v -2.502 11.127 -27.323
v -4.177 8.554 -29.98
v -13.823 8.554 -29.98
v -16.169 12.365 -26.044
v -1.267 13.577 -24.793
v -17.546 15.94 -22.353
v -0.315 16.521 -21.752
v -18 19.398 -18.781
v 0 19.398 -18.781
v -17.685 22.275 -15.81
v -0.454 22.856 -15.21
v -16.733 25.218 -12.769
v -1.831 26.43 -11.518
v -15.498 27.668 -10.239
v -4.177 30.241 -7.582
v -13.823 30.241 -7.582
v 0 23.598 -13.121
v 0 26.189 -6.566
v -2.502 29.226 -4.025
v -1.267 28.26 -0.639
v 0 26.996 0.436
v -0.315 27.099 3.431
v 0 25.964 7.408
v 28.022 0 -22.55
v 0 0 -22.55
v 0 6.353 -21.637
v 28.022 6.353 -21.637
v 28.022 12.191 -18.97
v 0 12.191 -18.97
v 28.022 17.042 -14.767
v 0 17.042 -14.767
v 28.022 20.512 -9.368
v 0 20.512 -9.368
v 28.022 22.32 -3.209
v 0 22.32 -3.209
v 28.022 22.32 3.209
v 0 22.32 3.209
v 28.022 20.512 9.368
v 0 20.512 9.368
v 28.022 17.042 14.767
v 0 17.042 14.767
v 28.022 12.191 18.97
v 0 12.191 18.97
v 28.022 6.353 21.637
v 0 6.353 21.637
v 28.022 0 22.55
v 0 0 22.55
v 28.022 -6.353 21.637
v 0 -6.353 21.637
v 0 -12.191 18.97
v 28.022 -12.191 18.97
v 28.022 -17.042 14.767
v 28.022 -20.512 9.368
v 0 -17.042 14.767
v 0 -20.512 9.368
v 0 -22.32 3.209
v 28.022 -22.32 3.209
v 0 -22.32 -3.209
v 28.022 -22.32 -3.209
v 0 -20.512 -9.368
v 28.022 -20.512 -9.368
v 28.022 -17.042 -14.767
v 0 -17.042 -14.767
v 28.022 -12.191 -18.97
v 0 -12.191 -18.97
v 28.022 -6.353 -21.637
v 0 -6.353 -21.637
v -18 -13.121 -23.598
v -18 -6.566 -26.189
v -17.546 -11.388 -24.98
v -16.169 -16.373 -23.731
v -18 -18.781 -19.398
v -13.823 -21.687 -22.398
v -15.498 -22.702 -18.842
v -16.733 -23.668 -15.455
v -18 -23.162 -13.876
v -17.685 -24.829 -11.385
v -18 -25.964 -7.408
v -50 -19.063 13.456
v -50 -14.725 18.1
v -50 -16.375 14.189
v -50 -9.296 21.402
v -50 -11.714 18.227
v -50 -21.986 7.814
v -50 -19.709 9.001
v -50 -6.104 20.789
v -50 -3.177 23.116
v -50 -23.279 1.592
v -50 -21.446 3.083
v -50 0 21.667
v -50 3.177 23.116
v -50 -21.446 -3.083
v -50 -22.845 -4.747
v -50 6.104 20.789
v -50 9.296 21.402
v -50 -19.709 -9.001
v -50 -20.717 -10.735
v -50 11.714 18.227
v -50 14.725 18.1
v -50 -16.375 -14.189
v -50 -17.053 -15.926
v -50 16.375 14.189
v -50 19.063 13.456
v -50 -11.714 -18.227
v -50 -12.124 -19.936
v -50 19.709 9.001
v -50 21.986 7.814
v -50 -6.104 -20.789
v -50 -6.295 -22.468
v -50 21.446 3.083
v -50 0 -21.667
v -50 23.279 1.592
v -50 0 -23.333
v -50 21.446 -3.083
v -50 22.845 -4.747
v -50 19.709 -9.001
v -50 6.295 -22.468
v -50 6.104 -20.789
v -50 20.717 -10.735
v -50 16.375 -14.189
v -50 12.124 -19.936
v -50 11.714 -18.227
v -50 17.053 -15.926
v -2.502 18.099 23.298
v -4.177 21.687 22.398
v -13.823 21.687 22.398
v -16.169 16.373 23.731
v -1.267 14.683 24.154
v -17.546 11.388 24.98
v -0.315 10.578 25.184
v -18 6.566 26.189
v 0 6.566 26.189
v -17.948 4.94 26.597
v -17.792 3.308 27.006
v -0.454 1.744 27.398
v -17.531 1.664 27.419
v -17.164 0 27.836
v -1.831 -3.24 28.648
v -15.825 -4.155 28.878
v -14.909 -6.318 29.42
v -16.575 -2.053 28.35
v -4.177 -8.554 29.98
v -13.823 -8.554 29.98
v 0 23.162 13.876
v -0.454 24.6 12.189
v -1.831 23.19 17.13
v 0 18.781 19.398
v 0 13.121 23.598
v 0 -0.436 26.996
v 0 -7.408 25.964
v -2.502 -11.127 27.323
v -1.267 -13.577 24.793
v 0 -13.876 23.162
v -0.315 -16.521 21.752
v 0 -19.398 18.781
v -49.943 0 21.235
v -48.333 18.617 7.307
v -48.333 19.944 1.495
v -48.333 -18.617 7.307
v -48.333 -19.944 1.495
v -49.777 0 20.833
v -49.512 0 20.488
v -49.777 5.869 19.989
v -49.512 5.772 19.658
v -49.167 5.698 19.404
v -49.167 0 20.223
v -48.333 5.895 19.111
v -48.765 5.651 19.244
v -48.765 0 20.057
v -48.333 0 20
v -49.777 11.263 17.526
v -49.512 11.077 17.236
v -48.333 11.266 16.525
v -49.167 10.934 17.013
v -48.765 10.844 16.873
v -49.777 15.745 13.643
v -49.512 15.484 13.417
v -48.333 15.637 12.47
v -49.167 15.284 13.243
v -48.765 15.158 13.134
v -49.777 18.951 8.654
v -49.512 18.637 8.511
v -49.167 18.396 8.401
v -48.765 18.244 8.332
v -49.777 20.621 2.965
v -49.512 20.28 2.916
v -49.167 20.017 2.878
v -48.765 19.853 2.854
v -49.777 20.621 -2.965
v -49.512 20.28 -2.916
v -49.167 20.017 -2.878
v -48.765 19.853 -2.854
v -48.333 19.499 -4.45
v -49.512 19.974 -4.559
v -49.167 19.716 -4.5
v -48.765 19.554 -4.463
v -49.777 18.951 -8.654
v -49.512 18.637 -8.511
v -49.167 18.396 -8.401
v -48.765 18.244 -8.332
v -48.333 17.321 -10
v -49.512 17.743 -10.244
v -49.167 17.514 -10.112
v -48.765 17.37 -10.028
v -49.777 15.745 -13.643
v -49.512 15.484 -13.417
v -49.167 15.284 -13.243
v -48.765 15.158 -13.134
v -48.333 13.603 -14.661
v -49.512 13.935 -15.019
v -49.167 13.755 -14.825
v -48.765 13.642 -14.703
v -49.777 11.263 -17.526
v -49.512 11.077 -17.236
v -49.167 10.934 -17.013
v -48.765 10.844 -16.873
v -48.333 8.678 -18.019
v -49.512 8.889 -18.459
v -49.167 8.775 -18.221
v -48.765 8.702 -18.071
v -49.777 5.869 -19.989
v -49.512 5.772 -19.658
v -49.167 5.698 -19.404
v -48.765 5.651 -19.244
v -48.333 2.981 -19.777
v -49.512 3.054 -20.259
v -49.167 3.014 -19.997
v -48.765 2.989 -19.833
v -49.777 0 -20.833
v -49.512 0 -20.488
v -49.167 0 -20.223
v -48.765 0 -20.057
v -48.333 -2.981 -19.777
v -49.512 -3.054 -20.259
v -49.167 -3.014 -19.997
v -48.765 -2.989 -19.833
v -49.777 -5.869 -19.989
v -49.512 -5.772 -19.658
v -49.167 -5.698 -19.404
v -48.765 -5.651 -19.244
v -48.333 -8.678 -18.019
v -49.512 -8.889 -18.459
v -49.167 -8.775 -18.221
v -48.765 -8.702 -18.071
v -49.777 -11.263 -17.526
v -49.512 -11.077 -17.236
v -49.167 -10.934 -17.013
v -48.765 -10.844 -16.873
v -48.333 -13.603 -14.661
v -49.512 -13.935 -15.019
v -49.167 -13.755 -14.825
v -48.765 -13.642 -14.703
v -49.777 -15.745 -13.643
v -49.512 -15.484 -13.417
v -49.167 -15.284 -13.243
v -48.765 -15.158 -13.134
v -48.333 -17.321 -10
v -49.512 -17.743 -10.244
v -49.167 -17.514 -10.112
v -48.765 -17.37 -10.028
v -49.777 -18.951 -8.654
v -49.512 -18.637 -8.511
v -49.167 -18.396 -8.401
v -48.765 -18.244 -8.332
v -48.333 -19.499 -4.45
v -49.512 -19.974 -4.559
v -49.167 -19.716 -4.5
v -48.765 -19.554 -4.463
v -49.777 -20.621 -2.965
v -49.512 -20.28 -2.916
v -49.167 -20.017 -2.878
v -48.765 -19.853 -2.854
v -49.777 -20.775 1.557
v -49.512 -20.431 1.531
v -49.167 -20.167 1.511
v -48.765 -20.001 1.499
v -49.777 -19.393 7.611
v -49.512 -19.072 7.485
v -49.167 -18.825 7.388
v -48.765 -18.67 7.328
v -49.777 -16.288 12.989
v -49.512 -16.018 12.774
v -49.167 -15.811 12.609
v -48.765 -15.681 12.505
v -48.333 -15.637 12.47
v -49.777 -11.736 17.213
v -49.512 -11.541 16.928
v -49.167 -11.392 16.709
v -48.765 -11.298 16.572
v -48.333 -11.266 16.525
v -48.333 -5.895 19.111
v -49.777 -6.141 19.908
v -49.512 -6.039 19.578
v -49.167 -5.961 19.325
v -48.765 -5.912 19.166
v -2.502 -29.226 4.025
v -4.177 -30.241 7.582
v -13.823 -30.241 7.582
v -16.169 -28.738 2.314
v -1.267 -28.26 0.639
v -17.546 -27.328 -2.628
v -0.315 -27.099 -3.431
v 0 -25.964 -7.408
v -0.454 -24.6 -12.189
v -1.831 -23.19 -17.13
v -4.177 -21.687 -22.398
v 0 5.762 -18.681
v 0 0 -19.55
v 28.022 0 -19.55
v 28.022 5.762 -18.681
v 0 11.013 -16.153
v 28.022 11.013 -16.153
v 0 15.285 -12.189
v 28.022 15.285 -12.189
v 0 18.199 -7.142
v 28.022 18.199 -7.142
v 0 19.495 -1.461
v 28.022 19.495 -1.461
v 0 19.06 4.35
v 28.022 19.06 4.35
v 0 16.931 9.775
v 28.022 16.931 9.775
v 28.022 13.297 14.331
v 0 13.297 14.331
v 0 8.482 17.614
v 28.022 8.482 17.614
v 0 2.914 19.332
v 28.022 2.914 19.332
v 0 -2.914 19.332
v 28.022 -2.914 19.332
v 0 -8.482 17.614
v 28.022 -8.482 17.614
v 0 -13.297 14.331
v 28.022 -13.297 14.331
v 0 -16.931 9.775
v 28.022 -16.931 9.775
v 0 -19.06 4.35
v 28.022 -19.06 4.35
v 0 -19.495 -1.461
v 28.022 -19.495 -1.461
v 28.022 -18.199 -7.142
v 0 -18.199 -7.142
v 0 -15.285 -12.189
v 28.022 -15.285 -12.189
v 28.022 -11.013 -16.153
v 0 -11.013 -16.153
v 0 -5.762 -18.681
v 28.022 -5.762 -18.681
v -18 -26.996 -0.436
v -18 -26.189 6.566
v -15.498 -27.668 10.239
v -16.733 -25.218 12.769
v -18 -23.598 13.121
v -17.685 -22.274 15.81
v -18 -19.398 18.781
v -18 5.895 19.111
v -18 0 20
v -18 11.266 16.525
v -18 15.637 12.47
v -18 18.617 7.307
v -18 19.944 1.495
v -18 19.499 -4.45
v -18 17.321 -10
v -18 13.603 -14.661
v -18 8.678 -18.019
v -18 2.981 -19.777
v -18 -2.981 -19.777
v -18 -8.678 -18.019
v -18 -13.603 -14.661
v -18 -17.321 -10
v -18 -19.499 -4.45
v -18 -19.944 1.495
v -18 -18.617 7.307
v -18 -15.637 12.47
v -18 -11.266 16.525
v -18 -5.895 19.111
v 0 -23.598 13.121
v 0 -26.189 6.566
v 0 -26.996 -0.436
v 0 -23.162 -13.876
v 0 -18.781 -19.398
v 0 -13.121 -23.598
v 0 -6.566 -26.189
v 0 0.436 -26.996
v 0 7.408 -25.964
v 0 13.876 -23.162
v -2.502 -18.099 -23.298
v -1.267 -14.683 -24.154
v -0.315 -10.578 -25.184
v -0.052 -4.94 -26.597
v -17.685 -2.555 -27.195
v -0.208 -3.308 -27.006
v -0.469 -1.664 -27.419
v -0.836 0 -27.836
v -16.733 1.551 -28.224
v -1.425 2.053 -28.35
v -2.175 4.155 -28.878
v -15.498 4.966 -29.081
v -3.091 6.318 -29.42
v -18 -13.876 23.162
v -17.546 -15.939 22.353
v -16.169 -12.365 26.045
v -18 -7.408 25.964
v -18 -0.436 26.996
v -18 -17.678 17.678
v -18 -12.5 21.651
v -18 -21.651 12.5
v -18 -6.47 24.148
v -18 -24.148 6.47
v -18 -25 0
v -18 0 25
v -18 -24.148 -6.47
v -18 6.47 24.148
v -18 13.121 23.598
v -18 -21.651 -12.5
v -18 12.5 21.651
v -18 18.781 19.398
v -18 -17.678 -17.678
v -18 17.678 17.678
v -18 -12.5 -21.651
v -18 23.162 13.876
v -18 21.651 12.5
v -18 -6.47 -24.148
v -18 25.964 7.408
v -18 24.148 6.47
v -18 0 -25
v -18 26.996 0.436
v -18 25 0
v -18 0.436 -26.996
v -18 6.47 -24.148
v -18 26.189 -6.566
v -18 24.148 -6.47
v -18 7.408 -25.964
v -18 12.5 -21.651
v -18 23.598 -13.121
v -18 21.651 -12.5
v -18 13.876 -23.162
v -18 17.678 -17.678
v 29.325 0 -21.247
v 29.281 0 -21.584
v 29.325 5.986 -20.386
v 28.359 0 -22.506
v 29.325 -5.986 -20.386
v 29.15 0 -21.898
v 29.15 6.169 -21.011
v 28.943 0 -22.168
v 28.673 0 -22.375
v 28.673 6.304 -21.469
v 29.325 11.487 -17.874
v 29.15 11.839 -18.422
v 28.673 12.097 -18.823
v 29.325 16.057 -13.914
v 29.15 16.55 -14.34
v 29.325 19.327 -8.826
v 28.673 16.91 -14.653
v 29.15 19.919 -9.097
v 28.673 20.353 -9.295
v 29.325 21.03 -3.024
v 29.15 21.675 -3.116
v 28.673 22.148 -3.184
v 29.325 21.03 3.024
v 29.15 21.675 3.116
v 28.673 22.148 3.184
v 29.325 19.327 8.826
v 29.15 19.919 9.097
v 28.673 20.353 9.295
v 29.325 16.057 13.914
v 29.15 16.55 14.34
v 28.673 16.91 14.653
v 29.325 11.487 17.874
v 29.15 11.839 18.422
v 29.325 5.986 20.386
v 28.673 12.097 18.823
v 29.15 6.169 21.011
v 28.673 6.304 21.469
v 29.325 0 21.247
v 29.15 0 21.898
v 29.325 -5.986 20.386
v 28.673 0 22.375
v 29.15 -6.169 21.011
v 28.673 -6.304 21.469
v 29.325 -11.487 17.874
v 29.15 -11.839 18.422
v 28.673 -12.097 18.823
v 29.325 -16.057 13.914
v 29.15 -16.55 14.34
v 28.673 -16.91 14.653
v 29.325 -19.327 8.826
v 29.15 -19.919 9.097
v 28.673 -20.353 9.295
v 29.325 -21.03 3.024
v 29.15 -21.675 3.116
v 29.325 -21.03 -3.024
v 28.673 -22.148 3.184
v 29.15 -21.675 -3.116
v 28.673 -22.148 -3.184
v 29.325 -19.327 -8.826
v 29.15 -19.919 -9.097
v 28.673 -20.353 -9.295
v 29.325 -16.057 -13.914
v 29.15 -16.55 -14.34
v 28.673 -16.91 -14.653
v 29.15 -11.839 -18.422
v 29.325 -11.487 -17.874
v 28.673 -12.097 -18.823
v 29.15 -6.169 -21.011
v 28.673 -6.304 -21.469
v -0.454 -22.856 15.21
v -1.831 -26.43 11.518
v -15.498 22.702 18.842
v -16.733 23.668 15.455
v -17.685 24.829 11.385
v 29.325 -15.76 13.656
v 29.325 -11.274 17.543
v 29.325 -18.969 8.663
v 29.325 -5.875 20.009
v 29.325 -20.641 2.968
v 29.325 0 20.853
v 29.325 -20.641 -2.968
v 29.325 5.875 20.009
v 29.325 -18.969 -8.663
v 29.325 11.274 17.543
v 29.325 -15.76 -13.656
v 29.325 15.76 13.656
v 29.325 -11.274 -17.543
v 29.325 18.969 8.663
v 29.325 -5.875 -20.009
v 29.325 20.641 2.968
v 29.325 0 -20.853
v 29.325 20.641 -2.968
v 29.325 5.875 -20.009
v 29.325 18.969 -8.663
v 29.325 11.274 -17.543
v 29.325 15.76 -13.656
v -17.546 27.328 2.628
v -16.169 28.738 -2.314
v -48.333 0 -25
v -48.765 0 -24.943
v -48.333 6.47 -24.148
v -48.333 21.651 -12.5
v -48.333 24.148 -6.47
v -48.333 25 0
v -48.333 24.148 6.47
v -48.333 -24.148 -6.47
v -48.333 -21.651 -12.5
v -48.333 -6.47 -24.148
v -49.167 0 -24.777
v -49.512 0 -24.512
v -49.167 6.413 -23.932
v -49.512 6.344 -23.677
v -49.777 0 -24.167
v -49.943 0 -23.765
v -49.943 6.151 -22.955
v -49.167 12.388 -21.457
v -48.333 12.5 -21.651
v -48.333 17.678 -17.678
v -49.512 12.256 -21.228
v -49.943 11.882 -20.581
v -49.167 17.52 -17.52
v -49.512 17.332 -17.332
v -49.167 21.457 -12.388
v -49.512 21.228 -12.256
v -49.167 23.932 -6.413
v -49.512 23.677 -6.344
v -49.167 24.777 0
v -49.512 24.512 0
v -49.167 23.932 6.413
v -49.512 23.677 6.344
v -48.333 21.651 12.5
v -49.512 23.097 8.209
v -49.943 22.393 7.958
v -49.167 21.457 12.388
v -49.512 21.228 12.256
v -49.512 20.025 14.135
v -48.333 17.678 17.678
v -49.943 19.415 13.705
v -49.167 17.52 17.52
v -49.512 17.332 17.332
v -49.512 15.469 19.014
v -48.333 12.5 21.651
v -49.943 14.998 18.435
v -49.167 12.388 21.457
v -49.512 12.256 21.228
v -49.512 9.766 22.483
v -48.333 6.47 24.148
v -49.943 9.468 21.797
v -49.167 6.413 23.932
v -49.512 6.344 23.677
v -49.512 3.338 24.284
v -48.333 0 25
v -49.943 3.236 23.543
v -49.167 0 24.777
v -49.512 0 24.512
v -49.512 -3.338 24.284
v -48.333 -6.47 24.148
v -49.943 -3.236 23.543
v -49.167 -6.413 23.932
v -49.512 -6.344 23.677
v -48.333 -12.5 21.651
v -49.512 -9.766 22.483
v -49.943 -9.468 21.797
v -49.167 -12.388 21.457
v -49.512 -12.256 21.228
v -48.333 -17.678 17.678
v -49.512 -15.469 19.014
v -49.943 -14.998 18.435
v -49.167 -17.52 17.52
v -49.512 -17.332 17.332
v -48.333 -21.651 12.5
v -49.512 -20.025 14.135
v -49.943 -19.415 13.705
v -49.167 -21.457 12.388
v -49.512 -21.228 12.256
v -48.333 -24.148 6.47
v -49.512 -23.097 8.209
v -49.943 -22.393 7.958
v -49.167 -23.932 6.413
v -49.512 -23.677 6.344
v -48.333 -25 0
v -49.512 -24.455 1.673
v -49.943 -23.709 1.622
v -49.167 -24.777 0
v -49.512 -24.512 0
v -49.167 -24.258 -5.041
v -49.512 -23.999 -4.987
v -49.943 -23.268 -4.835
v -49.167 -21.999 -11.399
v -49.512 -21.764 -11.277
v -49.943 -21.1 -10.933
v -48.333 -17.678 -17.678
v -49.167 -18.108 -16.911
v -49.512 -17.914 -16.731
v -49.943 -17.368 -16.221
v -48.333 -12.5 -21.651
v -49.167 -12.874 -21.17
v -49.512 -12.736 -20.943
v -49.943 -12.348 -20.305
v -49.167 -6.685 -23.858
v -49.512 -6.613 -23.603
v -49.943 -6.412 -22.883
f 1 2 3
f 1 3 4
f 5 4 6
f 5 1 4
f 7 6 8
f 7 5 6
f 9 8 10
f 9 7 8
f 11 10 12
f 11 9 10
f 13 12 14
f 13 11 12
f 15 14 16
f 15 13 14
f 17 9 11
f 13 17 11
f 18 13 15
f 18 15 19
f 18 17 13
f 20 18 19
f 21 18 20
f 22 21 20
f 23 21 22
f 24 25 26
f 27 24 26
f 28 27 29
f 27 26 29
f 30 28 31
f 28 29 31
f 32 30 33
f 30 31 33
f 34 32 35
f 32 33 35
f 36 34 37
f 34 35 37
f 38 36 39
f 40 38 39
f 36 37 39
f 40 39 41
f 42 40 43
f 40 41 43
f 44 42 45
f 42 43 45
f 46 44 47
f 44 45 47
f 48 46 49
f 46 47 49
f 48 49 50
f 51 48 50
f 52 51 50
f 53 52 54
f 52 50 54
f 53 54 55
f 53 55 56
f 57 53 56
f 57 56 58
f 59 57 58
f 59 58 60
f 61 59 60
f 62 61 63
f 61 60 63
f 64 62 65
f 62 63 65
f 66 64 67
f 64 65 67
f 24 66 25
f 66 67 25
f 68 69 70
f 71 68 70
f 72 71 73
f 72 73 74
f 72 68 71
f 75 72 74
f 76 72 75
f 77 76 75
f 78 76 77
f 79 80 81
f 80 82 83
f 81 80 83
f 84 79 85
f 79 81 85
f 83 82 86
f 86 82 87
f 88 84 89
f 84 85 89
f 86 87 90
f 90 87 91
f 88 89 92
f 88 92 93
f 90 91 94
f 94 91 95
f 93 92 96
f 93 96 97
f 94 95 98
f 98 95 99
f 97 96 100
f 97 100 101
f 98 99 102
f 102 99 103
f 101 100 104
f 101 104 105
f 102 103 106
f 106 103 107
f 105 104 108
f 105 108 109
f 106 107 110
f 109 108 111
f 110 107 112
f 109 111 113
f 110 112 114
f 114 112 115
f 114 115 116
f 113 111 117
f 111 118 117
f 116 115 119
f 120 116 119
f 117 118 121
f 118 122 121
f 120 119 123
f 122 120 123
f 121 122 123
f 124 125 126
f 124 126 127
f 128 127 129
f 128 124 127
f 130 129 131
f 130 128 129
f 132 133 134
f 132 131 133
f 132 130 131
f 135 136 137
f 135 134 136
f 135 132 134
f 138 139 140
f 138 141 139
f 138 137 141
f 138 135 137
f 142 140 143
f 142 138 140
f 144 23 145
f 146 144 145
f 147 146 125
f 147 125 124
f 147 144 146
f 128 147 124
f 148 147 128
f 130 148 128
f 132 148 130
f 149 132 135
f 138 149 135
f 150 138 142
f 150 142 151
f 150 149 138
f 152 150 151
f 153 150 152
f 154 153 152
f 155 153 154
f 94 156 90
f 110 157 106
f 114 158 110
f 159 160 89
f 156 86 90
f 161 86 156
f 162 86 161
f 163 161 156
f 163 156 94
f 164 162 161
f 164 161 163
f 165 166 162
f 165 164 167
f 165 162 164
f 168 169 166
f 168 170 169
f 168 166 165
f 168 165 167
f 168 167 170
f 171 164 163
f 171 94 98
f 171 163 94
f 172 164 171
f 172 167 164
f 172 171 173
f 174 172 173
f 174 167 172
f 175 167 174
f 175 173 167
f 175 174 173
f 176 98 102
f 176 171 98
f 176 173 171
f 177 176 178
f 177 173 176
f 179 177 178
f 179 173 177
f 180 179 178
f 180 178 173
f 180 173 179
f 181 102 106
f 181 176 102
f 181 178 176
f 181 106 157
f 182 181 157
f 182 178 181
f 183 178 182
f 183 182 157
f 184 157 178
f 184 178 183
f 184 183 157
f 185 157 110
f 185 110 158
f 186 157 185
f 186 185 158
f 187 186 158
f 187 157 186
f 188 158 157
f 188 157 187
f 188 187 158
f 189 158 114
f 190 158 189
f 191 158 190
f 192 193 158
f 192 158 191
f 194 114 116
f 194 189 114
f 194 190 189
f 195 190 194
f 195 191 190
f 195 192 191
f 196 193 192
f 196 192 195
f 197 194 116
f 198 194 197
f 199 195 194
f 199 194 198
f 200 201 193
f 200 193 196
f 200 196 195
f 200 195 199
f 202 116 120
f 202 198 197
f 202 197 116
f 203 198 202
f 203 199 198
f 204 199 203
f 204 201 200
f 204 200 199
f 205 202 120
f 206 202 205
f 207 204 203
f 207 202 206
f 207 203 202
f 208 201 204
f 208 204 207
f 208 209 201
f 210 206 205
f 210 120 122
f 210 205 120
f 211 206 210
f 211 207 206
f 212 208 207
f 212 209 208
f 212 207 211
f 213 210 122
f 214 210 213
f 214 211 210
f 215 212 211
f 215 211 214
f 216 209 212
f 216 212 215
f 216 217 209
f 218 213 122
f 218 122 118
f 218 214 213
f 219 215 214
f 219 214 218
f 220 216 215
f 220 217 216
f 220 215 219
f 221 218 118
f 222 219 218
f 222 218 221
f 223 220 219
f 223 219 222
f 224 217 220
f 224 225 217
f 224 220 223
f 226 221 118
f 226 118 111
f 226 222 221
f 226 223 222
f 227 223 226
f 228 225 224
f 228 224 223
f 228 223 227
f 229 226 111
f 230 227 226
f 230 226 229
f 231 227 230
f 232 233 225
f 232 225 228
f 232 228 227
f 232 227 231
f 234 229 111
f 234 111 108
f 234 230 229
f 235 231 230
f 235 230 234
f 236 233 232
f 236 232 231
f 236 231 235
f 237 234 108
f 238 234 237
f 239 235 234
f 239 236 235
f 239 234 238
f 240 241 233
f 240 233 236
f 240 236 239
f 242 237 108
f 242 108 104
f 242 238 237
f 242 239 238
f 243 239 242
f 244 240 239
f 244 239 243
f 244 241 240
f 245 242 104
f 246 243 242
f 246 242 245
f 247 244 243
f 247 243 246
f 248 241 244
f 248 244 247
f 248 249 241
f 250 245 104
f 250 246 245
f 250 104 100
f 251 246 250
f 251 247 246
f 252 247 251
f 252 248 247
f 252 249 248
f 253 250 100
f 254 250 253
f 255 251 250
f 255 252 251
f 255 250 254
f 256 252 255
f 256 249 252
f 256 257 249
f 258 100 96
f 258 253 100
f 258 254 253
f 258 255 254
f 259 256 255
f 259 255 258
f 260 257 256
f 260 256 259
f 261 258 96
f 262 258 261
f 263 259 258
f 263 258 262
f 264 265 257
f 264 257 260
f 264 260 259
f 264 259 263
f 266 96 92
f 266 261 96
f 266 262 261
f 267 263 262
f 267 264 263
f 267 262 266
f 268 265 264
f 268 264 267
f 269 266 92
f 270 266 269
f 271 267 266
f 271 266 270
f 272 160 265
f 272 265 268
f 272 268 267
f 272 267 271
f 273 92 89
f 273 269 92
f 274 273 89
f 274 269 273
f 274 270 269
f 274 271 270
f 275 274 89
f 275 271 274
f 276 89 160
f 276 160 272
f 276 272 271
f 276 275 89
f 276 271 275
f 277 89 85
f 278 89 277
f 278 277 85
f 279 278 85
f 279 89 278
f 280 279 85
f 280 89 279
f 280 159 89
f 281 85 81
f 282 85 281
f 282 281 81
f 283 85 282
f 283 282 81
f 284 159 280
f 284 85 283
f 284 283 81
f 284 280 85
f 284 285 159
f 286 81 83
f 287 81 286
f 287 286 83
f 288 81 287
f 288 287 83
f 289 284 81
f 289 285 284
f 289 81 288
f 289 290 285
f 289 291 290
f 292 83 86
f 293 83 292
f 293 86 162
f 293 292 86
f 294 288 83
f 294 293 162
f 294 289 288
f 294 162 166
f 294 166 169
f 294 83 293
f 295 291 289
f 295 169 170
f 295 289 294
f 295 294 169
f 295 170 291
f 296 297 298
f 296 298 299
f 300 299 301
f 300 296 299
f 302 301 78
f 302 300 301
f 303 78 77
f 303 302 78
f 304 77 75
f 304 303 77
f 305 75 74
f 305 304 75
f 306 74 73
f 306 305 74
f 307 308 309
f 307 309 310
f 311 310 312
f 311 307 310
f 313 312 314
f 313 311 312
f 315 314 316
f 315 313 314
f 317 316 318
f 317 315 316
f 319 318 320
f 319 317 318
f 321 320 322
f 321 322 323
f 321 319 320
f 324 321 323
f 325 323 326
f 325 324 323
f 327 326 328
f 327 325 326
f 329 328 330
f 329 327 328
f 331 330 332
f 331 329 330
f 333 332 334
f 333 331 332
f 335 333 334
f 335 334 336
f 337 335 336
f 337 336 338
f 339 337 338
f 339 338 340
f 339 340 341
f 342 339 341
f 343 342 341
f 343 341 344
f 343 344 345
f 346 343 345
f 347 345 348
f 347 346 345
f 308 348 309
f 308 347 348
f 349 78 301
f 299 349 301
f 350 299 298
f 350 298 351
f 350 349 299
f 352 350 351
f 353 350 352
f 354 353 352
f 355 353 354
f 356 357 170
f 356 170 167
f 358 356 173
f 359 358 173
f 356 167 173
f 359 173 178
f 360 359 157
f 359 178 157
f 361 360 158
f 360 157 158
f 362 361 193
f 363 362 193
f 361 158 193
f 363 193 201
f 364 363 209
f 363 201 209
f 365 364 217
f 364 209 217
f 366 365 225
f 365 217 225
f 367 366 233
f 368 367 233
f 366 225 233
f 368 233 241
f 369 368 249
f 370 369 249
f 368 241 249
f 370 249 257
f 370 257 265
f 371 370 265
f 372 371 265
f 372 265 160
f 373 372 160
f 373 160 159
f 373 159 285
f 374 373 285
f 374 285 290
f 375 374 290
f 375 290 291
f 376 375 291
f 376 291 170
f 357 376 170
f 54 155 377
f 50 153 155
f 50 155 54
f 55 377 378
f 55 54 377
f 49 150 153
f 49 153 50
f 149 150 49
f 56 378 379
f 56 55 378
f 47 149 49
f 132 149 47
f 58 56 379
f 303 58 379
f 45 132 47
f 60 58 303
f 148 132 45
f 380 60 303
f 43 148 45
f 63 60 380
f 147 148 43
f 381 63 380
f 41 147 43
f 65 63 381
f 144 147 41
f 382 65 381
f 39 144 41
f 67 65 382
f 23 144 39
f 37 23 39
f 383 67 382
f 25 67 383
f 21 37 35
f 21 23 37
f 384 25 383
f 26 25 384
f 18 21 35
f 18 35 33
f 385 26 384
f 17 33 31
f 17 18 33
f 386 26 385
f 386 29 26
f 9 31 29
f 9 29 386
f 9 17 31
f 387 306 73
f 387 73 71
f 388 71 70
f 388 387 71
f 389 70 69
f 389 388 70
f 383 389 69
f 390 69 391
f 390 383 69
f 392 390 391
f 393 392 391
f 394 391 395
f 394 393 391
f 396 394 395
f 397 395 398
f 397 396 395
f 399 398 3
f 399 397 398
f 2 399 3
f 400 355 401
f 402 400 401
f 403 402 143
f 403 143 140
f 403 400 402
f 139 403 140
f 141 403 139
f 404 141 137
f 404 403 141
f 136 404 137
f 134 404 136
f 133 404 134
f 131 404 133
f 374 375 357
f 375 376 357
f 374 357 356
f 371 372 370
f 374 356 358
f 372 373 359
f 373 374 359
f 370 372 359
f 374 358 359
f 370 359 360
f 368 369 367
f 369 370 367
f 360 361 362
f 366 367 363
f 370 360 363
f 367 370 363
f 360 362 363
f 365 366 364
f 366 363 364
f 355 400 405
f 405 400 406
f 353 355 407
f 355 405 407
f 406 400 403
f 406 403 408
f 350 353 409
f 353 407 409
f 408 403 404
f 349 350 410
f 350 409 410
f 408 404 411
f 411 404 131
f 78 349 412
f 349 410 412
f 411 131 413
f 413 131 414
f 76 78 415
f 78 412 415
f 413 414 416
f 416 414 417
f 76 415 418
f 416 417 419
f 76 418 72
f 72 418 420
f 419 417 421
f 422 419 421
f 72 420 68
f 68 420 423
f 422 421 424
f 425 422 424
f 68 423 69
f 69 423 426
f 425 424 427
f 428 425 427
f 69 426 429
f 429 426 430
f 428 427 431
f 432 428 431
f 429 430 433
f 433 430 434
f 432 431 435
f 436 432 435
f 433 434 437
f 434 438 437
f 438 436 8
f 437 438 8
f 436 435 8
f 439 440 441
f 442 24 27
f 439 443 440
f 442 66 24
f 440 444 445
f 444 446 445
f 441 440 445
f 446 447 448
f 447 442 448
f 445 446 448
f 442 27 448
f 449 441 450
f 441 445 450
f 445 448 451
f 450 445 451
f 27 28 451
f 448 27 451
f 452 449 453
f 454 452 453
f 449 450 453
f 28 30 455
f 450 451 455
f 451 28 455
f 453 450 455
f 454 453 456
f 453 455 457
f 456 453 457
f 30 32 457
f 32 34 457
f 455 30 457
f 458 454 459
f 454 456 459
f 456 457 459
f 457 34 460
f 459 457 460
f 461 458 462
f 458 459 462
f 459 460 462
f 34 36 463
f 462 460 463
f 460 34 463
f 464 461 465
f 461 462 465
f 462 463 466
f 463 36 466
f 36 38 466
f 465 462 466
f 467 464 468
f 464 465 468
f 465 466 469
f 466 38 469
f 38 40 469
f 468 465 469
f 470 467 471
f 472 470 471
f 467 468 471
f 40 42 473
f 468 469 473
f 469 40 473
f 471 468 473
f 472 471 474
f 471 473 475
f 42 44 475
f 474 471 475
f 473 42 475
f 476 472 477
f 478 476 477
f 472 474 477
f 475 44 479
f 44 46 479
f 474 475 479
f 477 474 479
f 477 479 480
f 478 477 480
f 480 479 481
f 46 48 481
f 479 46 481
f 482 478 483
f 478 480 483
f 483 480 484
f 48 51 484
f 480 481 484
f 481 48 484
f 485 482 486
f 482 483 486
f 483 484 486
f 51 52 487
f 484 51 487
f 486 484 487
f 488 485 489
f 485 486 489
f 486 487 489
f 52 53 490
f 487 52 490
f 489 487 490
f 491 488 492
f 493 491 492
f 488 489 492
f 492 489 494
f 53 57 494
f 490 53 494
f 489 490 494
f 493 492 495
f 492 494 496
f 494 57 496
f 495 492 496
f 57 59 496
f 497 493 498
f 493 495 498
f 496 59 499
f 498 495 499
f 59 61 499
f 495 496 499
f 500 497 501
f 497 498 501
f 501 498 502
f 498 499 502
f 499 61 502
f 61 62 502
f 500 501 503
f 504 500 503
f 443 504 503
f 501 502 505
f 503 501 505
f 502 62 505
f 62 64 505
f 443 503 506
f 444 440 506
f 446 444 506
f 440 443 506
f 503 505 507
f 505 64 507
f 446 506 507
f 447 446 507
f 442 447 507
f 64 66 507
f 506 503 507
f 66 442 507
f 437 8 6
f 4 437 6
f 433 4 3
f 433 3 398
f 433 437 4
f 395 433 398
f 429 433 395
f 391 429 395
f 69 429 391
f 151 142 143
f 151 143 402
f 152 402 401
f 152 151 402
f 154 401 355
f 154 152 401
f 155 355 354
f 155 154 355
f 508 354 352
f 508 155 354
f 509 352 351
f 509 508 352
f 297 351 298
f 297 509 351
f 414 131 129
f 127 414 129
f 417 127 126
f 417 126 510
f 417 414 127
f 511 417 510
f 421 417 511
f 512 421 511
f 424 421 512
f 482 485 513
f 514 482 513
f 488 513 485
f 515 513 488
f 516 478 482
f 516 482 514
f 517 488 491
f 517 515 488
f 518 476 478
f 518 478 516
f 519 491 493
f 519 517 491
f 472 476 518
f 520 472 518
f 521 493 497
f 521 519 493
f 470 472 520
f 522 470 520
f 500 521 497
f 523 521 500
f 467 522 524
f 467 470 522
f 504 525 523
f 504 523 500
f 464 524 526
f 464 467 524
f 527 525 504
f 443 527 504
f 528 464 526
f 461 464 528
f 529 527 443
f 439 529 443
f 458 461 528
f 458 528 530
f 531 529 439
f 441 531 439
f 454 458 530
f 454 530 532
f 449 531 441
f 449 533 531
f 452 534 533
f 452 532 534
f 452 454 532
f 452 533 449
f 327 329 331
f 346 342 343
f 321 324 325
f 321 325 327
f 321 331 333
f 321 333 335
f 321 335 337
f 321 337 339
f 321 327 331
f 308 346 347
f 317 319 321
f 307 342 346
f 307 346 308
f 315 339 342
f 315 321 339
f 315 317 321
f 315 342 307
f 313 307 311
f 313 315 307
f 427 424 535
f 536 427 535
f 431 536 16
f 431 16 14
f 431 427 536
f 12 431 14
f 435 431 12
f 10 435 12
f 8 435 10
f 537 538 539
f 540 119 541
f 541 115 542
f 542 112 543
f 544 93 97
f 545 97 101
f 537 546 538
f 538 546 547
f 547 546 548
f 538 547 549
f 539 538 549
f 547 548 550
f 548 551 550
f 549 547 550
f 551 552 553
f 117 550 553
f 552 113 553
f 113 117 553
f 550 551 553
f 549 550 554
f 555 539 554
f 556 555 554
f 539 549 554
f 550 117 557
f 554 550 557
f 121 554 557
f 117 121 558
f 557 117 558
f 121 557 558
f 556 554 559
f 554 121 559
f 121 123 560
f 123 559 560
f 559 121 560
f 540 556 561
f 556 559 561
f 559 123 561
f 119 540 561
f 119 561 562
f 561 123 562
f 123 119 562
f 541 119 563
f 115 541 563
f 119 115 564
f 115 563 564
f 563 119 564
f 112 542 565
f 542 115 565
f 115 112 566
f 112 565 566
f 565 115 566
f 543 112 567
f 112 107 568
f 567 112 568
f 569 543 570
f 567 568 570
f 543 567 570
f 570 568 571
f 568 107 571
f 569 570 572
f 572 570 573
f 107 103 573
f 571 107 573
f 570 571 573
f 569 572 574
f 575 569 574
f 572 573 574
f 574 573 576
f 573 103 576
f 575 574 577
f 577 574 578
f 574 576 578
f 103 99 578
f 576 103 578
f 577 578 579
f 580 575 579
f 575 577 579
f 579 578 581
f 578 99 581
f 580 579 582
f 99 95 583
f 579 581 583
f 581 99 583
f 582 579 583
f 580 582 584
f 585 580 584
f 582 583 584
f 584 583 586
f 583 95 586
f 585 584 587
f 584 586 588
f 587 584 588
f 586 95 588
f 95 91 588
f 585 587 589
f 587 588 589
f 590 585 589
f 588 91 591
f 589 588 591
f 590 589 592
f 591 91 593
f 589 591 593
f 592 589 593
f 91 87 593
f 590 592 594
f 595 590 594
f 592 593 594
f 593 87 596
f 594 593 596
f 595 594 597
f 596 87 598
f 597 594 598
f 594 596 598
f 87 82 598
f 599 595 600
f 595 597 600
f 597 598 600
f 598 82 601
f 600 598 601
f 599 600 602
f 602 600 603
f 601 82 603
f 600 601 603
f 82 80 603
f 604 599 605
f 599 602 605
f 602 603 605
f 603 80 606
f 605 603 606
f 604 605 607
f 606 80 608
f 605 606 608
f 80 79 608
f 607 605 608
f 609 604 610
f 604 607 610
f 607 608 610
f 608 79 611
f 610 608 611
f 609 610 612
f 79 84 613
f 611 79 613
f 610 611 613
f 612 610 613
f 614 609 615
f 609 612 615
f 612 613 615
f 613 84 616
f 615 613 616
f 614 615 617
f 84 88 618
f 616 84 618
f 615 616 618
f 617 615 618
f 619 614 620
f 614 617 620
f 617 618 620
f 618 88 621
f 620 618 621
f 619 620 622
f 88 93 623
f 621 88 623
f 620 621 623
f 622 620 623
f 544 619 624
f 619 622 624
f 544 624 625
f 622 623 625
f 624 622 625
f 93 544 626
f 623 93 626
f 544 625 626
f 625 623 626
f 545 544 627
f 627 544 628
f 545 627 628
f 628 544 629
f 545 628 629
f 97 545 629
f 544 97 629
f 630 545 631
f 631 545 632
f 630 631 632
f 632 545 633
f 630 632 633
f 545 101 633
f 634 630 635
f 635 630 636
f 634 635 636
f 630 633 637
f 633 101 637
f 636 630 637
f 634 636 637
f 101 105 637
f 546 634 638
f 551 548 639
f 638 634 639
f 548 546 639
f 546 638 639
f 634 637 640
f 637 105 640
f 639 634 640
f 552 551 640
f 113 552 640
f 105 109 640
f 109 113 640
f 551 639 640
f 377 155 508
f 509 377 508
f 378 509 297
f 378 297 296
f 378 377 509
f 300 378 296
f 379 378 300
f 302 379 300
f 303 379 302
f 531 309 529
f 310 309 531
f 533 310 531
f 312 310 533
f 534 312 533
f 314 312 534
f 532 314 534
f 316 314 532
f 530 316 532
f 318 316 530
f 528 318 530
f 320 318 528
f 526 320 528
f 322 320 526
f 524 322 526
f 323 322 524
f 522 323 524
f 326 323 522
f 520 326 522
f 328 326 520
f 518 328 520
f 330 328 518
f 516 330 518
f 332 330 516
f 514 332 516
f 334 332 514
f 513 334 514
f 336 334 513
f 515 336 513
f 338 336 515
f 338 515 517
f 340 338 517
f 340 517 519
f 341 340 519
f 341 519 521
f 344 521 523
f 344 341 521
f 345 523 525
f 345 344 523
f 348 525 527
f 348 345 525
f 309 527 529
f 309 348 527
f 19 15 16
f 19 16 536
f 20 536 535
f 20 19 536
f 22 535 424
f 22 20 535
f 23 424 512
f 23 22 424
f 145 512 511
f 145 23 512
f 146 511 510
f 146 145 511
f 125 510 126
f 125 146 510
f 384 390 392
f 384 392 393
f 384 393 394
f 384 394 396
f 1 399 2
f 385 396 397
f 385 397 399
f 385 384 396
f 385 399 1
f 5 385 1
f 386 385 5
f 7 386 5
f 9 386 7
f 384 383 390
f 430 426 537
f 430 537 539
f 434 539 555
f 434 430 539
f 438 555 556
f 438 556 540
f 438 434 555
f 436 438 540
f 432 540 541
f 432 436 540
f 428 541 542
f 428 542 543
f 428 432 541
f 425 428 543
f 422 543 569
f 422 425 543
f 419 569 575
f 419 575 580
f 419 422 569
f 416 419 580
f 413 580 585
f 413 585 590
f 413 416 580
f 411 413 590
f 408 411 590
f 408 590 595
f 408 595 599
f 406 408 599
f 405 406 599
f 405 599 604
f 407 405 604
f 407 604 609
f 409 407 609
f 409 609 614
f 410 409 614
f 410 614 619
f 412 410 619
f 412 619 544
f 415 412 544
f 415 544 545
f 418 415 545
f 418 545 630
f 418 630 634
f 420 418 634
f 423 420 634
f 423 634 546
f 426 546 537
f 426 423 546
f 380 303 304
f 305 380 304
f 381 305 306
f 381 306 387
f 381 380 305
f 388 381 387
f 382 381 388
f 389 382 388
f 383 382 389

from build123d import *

# Parameters (mm, degrees)
SKETCH_1_R          = 25
EXTRUDE_1_DEPTH     = 50
SKETCH_2_R          = 20
CUT_EXTRUDE_1_DEPTH = 48
EXTRUDE_2_DEPTH     = 18
SKETCH_4_OUTSIDE_W  = 101.712
SKETCH_4_OUTSIDE_H  = 102.234
SKETCH_4_OUTSIDE_R  = 27
CUT_EXTRUDE_3_DEPTH = 10
CUT_EXTRUDE_3_DRAFT = -45
SKETCH_5_OUTSIDE_W  = 101.712
SKETCH_5_OUTSIDE_H  = 102.234
SKETCH_5_OUTSIDE_R  = 27
CUT_EXTRUDE_4_DEPTH = 10
CUT_EXTRUDE_4_DRAFT = -45
SKETCH_6_R          = 22.55
SKETCH_6_R_2        = 19.55
EXTRUDE_1_2_DEPTH   = 29.325
FILLET_1_R          = 1.666666667
CHAMFER_1_SIZE      = 1.303333333
FILLET_2_R          = 1.303333333


with BuildPart() as part:
    # Эскиз1 → Extrude 1 (new body)
    with BuildSketch(Plane(origin=(0, 0, 0), x_dir=(0, 0, -1), z_dir=(1, 0, 0))):
        Circle(SKETCH_1_R)
    extrude(amount=-EXTRUDE_1_DEPTH)

    # Эскиз2 → Вырез-Вытянуть1 (cut)
    with BuildSketch(Plane.ZY.offset(50)):
        Circle(SKETCH_2_R)
    extrude(amount=-CUT_EXTRUDE_1_DEPTH, mode=Mode.SUBTRACT)

    # Эскиз3 → Бобышка-Вытянуть2 (add)
    with BuildSketch(Plane(origin=(0, 0, 0), x_dir=(0, 0, -1), z_dir=(1, 0, 0))):
        Polygon((22.398442547, -21.686626558), (29.980390795, 8.554306971), (7.581948249, 30.24093353), (-22.398442547, 21.686626558), (-29.980390795, -8.554306971), (-7.581948249, -30.24093353), align=None)
    extrude(amount=-EXTRUDE_2_DEPTH)


with BuildPart() as cut_extrude_3_tool:
    # Эскиз4 outside → Вырез-Вытянуть3 (with draft: the straight prism first)
    with BuildSketch(Plane(origin=(0, 0, 0), x_dir=(0, 0, -1), z_dir=(1, 0, 0))):
        Rectangle(SKETCH_4_OUTSIDE_W, SKETCH_4_OUTSIDE_H)
        Circle(SKETCH_4_OUTSIDE_R, mode=Mode.SUBTRACT)
    extrude(amount=-CUT_EXTRUDE_3_DEPTH)
    # Вырез-Вытянуть3: the draft: its side faces are tilted about the plane it starts from
    cut_extrude_3_sides = [cut_extrude_3_tool.faces().sort_by_distance(p)[0] for p in [
        (-5, -51.117, 0),
        (-5, 0, -50.856),
        (-5, 51.117, 0),
        (-5, 0, 50.856),
        (-5, 0, 27),
    ]]
    draft(cut_extrude_3_sides, Plane(origin=(0, 0, 0), x_dir=(0, 0, -1), z_dir=(1, 0, 0)), CUT_EXTRUDE_3_DRAFT)


with BuildPart() as part_1:
    add(part.part)

    # Вырез-Вытянуть3: cut by cut_extrude_3_tool
    add(cut_extrude_3_tool.part, mode=Mode.SUBTRACT)


with BuildPart() as cut_extrude_4_tool:
    # Эскиз5 outside → Вырез-Вытянуть4 (with draft: the straight prism first)
    with BuildSketch(Plane.ZY.offset(18)):
        Rectangle(SKETCH_5_OUTSIDE_W, SKETCH_5_OUTSIDE_H)
        Circle(SKETCH_5_OUTSIDE_R, mode=Mode.SUBTRACT)
    extrude(amount=-CUT_EXTRUDE_4_DEPTH)
    # Вырез-Вытянуть4: the draft: its side faces are tilted about the plane it starts from
    cut_extrude_4_sides = [cut_extrude_4_tool.faces().sort_by_distance(p)[0] for p in [
        (-13, -51.117, 0),
        (-13, 0, 50.856),
        (-13, 51.117, 0),
        (-13, 0, -50.856),
        (-13, 0, -27),
    ]]
    draft(cut_extrude_4_sides, Plane.ZY.offset(18), CUT_EXTRUDE_4_DRAFT)


with BuildPart() as part_2:
    add(part_1.part)

    # Вырез-Вытянуть4: cut by cut_extrude_4_tool
    add(cut_extrude_4_tool.part, mode=Mode.SUBTRACT)

    # Эскиз6 → Extrude 1 2 (add)
    with BuildSketch(Plane(origin=(0, 0, 0), x_dir=(0, 0, -1), z_dir=(1, 0, 0))):
        Circle(SKETCH_6_R)
        Circle(SKETCH_6_R_2, mode=Mode.SUBTRACT)
    extrude(amount=EXTRUDE_1_2_DEPTH)

    # Скругление1
    fillet_1_edges = [part_2.edges().sort_by_distance(p)[0] for p in [
        (-50, 0, 25),
        (-50, 0, -20),
    ]]
    fillet(fillet_1_edges, radius=FILLET_1_R)

    # Фаска1
    chamfer_1_edges = [part_2.edges().sort_by_distance(p)[0] for p in [
        (29.325, 0, 19.55),
    ]]
    chamfer(chamfer_1_edges, length=CHAMFER_1_SIZE)

    # Скругление2
    fillet_2_edges = [part_2.edges().sort_by_distance(p)[0] for p in [
        (29.325, 0, 22.55),
    ]]
    fillet(fillet_2_edges, radius=FILLET_2_R)


solid = part_2.part
